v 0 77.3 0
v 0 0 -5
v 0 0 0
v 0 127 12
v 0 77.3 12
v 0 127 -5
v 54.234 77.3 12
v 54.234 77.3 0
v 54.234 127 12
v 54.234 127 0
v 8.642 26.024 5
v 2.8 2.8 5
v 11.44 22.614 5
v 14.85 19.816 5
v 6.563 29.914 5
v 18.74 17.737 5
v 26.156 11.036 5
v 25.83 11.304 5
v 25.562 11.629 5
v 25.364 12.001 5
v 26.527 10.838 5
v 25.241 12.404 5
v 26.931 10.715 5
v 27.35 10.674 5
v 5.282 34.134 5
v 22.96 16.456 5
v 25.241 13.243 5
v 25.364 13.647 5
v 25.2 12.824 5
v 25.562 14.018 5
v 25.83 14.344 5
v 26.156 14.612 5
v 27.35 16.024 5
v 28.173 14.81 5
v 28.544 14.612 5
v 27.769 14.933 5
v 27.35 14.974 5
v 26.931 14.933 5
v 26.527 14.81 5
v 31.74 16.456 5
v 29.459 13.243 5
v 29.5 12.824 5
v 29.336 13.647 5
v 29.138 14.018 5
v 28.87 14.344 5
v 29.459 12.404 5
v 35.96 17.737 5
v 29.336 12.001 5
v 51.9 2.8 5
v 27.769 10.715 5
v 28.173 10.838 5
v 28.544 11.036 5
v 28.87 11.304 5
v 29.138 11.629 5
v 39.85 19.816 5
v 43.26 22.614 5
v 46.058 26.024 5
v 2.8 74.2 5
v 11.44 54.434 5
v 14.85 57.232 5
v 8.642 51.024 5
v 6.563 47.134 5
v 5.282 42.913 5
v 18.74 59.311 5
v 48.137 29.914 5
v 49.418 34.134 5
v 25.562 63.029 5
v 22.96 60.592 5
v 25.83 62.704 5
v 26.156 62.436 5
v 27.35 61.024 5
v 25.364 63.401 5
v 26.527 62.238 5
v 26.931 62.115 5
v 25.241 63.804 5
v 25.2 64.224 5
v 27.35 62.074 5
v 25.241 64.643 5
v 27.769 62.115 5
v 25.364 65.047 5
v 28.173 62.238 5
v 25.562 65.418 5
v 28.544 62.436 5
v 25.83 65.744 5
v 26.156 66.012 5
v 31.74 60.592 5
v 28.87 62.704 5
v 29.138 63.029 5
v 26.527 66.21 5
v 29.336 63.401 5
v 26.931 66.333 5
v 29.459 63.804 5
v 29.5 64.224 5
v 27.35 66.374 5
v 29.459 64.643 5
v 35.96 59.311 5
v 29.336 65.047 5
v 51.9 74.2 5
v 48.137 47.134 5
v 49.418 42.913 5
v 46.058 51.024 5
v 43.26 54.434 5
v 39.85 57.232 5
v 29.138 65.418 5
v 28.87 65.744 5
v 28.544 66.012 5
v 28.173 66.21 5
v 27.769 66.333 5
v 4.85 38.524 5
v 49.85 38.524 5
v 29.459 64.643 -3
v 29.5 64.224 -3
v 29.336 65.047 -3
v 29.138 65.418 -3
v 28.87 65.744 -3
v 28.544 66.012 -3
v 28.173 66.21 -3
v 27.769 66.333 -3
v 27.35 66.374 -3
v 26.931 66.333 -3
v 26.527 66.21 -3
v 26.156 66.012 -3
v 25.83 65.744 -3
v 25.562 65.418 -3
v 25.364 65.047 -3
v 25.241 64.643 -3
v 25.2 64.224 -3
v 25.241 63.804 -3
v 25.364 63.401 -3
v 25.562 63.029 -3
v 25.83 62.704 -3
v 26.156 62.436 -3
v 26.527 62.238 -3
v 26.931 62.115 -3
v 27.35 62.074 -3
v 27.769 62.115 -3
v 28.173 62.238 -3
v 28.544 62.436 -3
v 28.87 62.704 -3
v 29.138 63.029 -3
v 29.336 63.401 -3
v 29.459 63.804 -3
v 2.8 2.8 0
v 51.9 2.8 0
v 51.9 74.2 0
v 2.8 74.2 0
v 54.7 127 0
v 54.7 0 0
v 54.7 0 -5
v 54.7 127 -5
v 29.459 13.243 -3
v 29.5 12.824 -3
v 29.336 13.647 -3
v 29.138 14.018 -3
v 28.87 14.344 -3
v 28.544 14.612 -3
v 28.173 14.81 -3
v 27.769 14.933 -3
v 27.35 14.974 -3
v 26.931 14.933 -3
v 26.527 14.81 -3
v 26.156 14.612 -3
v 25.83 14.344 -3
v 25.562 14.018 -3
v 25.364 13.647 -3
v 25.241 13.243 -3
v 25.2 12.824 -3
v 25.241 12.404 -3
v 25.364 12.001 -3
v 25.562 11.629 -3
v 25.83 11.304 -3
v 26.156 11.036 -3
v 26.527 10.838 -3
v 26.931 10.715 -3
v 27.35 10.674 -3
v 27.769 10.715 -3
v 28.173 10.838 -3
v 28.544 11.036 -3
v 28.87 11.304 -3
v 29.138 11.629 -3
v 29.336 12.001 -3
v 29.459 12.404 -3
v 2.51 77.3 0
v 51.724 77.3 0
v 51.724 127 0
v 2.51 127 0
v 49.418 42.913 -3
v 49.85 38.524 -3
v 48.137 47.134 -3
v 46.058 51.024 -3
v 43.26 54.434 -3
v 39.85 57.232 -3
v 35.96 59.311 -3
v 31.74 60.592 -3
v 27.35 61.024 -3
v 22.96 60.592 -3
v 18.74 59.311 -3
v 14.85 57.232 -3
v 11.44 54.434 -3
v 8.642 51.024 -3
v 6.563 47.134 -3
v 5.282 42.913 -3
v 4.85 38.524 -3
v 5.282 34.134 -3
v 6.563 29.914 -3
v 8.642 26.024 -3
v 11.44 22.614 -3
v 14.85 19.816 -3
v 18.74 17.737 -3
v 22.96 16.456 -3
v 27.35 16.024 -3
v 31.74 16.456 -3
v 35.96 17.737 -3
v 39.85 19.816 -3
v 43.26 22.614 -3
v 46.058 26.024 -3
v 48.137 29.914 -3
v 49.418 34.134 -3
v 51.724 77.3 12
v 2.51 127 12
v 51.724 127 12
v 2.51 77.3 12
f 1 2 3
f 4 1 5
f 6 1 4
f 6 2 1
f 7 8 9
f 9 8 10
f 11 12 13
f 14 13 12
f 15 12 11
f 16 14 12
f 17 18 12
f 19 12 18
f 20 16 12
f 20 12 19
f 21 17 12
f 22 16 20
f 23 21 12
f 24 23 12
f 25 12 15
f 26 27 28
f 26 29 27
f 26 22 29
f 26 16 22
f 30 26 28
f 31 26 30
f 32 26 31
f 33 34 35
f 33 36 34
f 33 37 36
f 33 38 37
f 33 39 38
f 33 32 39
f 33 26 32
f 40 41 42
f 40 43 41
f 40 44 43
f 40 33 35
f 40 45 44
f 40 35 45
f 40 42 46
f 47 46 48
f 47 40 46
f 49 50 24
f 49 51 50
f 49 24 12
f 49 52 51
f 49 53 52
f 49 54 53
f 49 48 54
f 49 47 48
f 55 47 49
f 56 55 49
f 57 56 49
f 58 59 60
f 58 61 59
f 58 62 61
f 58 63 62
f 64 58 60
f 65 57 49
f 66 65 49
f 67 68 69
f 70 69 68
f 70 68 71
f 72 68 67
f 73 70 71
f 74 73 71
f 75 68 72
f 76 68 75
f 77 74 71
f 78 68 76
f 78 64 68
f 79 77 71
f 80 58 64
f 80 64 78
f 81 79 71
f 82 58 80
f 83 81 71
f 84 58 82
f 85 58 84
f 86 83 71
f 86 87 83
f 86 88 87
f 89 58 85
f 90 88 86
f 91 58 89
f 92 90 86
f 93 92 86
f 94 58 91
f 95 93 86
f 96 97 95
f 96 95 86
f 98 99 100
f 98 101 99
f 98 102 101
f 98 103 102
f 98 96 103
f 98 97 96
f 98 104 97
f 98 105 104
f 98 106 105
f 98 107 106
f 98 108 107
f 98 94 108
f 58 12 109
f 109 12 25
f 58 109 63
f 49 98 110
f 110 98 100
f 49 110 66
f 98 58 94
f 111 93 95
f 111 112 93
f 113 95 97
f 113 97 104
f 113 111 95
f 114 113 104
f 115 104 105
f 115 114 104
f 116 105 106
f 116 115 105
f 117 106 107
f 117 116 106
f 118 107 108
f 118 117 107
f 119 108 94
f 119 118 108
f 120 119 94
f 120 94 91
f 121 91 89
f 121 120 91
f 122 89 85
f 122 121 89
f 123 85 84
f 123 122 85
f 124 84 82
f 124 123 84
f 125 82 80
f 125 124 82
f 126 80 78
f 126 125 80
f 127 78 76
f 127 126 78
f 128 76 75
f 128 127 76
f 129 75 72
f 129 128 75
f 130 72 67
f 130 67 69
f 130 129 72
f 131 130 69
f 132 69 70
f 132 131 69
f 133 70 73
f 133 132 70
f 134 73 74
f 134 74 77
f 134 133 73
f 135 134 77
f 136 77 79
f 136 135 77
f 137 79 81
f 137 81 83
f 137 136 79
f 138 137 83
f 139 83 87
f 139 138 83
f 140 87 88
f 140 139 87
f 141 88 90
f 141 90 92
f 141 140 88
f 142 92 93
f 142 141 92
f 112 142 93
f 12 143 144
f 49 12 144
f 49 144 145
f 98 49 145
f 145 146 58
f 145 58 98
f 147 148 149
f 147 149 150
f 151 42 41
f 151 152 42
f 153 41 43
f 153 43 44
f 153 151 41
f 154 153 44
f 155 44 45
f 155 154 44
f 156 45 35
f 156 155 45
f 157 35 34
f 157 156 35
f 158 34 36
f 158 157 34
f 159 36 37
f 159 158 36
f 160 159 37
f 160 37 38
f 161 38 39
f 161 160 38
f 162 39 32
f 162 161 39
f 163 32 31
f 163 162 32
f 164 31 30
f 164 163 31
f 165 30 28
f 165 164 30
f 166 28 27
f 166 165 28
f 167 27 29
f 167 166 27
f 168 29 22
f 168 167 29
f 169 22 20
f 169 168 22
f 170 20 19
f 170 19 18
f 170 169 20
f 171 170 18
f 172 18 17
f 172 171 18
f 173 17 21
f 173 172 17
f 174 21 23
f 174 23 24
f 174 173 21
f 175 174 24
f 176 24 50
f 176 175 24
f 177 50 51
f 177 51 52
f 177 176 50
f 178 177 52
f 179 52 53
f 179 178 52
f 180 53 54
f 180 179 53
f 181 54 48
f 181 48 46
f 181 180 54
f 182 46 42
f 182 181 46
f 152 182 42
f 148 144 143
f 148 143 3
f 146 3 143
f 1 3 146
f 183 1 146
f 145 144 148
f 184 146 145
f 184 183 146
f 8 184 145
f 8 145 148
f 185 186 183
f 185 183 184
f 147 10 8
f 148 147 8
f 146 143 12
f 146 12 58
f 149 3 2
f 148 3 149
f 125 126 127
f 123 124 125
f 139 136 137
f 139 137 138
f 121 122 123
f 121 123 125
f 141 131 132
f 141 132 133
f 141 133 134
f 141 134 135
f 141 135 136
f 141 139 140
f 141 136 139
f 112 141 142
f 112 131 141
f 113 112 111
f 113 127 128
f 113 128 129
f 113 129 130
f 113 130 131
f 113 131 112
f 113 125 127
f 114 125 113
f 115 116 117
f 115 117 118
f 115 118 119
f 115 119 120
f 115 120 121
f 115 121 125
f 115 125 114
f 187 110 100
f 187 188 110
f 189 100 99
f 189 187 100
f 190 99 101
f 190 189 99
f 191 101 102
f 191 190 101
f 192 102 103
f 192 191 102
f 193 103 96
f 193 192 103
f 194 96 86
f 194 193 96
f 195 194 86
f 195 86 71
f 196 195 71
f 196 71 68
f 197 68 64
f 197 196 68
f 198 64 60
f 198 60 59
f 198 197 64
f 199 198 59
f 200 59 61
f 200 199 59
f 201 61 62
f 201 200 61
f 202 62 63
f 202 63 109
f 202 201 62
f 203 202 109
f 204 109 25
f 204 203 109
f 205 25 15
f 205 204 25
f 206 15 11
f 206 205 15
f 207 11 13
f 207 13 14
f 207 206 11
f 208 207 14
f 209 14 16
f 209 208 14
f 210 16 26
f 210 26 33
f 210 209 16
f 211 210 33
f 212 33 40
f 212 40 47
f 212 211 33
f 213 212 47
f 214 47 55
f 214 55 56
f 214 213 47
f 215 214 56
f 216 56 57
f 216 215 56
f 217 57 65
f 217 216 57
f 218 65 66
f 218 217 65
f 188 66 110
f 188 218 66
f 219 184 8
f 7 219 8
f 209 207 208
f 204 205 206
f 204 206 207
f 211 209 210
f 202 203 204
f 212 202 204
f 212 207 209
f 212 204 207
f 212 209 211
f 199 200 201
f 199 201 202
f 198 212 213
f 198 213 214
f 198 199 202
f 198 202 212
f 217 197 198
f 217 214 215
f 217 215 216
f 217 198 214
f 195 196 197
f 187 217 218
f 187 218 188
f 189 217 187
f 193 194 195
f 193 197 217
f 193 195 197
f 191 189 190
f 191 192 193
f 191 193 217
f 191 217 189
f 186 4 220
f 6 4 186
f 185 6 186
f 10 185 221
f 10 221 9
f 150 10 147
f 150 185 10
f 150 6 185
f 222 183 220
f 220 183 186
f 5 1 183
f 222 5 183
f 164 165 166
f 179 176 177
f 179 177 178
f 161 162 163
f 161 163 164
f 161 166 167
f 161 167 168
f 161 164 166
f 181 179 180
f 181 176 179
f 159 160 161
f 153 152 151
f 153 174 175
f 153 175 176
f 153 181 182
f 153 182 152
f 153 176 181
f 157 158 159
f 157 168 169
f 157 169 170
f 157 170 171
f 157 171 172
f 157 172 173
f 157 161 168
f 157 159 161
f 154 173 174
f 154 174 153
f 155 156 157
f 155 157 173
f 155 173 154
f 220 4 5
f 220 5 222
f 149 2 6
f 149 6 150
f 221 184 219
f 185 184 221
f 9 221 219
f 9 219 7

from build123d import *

# Parameters (mm, degrees)
SKETCH_W      = 54.7
SKETCH_H      = 127
PAD_DEPTH     = 5
SKETCH001_W   = 49.1
SKETCH001_H   = 71.4
SKETCH001_R   = 2.15
SKETCH001_R_2 = 22.5
PAD001_DEPTH  = 5
SKETCH002_R   = 2.15
SKETCH002_R_2 = 22.5
POCKET_DEPTH  = 3
SKETCH003_W   = 2.51
SKETCH003_H   = 49.7
PAD002_DEPTH  = 12


with BuildPart() as part:
    # Sketch → Pad (new body)
    with BuildSketch(Plane.XY):
        with Locations((27.35, 63.5)):
            Rectangle(SKETCH_W, SKETCH_H)
    extrude(amount=-PAD_DEPTH)

    # Sketch001 → Pad001 (join)
    with BuildSketch(Plane.XY):
        with Locations((27.35, 38.5)):
            Rectangle(SKETCH001_W, SKETCH001_H)
        with Locations((27.35, 12.823933)):
            Circle(SKETCH001_R, mode=Mode.SUBTRACT)
        with Locations((27.35, 64.223933)):
            Circle(SKETCH001_R, mode=Mode.SUBTRACT)
        with Locations((27.35, 38.523933)):
            Circle(SKETCH001_R_2, mode=Mode.SUBTRACT)
    extrude(amount=PAD001_DEPTH)

    # Sketch002 → Pocket (cut)
    with BuildSketch(Plane.XY):
        with Locations((27.35, 12.823933)):
            Circle(SKETCH002_R)
        with Locations((27.35, 64.223933)):
            Circle(SKETCH002_R)
        with Locations((27.35, 38.523933)):
            Circle(SKETCH002_R_2)
    extrude(amount=-POCKET_DEPTH, mode=Mode.SUBTRACT)

    # Sketch003 → Pad002 (join)
    with BuildSketch(Plane.XY):
        with Locations((1.255, 102.15)):
            Rectangle(SKETCH003_W, SKETCH003_H)
        with Locations((52.979469, 102.15)):
            Rectangle(SKETCH003_W, SKETCH003_H)
    extrude(amount=PAD002_DEPTH)


solid = part.part
